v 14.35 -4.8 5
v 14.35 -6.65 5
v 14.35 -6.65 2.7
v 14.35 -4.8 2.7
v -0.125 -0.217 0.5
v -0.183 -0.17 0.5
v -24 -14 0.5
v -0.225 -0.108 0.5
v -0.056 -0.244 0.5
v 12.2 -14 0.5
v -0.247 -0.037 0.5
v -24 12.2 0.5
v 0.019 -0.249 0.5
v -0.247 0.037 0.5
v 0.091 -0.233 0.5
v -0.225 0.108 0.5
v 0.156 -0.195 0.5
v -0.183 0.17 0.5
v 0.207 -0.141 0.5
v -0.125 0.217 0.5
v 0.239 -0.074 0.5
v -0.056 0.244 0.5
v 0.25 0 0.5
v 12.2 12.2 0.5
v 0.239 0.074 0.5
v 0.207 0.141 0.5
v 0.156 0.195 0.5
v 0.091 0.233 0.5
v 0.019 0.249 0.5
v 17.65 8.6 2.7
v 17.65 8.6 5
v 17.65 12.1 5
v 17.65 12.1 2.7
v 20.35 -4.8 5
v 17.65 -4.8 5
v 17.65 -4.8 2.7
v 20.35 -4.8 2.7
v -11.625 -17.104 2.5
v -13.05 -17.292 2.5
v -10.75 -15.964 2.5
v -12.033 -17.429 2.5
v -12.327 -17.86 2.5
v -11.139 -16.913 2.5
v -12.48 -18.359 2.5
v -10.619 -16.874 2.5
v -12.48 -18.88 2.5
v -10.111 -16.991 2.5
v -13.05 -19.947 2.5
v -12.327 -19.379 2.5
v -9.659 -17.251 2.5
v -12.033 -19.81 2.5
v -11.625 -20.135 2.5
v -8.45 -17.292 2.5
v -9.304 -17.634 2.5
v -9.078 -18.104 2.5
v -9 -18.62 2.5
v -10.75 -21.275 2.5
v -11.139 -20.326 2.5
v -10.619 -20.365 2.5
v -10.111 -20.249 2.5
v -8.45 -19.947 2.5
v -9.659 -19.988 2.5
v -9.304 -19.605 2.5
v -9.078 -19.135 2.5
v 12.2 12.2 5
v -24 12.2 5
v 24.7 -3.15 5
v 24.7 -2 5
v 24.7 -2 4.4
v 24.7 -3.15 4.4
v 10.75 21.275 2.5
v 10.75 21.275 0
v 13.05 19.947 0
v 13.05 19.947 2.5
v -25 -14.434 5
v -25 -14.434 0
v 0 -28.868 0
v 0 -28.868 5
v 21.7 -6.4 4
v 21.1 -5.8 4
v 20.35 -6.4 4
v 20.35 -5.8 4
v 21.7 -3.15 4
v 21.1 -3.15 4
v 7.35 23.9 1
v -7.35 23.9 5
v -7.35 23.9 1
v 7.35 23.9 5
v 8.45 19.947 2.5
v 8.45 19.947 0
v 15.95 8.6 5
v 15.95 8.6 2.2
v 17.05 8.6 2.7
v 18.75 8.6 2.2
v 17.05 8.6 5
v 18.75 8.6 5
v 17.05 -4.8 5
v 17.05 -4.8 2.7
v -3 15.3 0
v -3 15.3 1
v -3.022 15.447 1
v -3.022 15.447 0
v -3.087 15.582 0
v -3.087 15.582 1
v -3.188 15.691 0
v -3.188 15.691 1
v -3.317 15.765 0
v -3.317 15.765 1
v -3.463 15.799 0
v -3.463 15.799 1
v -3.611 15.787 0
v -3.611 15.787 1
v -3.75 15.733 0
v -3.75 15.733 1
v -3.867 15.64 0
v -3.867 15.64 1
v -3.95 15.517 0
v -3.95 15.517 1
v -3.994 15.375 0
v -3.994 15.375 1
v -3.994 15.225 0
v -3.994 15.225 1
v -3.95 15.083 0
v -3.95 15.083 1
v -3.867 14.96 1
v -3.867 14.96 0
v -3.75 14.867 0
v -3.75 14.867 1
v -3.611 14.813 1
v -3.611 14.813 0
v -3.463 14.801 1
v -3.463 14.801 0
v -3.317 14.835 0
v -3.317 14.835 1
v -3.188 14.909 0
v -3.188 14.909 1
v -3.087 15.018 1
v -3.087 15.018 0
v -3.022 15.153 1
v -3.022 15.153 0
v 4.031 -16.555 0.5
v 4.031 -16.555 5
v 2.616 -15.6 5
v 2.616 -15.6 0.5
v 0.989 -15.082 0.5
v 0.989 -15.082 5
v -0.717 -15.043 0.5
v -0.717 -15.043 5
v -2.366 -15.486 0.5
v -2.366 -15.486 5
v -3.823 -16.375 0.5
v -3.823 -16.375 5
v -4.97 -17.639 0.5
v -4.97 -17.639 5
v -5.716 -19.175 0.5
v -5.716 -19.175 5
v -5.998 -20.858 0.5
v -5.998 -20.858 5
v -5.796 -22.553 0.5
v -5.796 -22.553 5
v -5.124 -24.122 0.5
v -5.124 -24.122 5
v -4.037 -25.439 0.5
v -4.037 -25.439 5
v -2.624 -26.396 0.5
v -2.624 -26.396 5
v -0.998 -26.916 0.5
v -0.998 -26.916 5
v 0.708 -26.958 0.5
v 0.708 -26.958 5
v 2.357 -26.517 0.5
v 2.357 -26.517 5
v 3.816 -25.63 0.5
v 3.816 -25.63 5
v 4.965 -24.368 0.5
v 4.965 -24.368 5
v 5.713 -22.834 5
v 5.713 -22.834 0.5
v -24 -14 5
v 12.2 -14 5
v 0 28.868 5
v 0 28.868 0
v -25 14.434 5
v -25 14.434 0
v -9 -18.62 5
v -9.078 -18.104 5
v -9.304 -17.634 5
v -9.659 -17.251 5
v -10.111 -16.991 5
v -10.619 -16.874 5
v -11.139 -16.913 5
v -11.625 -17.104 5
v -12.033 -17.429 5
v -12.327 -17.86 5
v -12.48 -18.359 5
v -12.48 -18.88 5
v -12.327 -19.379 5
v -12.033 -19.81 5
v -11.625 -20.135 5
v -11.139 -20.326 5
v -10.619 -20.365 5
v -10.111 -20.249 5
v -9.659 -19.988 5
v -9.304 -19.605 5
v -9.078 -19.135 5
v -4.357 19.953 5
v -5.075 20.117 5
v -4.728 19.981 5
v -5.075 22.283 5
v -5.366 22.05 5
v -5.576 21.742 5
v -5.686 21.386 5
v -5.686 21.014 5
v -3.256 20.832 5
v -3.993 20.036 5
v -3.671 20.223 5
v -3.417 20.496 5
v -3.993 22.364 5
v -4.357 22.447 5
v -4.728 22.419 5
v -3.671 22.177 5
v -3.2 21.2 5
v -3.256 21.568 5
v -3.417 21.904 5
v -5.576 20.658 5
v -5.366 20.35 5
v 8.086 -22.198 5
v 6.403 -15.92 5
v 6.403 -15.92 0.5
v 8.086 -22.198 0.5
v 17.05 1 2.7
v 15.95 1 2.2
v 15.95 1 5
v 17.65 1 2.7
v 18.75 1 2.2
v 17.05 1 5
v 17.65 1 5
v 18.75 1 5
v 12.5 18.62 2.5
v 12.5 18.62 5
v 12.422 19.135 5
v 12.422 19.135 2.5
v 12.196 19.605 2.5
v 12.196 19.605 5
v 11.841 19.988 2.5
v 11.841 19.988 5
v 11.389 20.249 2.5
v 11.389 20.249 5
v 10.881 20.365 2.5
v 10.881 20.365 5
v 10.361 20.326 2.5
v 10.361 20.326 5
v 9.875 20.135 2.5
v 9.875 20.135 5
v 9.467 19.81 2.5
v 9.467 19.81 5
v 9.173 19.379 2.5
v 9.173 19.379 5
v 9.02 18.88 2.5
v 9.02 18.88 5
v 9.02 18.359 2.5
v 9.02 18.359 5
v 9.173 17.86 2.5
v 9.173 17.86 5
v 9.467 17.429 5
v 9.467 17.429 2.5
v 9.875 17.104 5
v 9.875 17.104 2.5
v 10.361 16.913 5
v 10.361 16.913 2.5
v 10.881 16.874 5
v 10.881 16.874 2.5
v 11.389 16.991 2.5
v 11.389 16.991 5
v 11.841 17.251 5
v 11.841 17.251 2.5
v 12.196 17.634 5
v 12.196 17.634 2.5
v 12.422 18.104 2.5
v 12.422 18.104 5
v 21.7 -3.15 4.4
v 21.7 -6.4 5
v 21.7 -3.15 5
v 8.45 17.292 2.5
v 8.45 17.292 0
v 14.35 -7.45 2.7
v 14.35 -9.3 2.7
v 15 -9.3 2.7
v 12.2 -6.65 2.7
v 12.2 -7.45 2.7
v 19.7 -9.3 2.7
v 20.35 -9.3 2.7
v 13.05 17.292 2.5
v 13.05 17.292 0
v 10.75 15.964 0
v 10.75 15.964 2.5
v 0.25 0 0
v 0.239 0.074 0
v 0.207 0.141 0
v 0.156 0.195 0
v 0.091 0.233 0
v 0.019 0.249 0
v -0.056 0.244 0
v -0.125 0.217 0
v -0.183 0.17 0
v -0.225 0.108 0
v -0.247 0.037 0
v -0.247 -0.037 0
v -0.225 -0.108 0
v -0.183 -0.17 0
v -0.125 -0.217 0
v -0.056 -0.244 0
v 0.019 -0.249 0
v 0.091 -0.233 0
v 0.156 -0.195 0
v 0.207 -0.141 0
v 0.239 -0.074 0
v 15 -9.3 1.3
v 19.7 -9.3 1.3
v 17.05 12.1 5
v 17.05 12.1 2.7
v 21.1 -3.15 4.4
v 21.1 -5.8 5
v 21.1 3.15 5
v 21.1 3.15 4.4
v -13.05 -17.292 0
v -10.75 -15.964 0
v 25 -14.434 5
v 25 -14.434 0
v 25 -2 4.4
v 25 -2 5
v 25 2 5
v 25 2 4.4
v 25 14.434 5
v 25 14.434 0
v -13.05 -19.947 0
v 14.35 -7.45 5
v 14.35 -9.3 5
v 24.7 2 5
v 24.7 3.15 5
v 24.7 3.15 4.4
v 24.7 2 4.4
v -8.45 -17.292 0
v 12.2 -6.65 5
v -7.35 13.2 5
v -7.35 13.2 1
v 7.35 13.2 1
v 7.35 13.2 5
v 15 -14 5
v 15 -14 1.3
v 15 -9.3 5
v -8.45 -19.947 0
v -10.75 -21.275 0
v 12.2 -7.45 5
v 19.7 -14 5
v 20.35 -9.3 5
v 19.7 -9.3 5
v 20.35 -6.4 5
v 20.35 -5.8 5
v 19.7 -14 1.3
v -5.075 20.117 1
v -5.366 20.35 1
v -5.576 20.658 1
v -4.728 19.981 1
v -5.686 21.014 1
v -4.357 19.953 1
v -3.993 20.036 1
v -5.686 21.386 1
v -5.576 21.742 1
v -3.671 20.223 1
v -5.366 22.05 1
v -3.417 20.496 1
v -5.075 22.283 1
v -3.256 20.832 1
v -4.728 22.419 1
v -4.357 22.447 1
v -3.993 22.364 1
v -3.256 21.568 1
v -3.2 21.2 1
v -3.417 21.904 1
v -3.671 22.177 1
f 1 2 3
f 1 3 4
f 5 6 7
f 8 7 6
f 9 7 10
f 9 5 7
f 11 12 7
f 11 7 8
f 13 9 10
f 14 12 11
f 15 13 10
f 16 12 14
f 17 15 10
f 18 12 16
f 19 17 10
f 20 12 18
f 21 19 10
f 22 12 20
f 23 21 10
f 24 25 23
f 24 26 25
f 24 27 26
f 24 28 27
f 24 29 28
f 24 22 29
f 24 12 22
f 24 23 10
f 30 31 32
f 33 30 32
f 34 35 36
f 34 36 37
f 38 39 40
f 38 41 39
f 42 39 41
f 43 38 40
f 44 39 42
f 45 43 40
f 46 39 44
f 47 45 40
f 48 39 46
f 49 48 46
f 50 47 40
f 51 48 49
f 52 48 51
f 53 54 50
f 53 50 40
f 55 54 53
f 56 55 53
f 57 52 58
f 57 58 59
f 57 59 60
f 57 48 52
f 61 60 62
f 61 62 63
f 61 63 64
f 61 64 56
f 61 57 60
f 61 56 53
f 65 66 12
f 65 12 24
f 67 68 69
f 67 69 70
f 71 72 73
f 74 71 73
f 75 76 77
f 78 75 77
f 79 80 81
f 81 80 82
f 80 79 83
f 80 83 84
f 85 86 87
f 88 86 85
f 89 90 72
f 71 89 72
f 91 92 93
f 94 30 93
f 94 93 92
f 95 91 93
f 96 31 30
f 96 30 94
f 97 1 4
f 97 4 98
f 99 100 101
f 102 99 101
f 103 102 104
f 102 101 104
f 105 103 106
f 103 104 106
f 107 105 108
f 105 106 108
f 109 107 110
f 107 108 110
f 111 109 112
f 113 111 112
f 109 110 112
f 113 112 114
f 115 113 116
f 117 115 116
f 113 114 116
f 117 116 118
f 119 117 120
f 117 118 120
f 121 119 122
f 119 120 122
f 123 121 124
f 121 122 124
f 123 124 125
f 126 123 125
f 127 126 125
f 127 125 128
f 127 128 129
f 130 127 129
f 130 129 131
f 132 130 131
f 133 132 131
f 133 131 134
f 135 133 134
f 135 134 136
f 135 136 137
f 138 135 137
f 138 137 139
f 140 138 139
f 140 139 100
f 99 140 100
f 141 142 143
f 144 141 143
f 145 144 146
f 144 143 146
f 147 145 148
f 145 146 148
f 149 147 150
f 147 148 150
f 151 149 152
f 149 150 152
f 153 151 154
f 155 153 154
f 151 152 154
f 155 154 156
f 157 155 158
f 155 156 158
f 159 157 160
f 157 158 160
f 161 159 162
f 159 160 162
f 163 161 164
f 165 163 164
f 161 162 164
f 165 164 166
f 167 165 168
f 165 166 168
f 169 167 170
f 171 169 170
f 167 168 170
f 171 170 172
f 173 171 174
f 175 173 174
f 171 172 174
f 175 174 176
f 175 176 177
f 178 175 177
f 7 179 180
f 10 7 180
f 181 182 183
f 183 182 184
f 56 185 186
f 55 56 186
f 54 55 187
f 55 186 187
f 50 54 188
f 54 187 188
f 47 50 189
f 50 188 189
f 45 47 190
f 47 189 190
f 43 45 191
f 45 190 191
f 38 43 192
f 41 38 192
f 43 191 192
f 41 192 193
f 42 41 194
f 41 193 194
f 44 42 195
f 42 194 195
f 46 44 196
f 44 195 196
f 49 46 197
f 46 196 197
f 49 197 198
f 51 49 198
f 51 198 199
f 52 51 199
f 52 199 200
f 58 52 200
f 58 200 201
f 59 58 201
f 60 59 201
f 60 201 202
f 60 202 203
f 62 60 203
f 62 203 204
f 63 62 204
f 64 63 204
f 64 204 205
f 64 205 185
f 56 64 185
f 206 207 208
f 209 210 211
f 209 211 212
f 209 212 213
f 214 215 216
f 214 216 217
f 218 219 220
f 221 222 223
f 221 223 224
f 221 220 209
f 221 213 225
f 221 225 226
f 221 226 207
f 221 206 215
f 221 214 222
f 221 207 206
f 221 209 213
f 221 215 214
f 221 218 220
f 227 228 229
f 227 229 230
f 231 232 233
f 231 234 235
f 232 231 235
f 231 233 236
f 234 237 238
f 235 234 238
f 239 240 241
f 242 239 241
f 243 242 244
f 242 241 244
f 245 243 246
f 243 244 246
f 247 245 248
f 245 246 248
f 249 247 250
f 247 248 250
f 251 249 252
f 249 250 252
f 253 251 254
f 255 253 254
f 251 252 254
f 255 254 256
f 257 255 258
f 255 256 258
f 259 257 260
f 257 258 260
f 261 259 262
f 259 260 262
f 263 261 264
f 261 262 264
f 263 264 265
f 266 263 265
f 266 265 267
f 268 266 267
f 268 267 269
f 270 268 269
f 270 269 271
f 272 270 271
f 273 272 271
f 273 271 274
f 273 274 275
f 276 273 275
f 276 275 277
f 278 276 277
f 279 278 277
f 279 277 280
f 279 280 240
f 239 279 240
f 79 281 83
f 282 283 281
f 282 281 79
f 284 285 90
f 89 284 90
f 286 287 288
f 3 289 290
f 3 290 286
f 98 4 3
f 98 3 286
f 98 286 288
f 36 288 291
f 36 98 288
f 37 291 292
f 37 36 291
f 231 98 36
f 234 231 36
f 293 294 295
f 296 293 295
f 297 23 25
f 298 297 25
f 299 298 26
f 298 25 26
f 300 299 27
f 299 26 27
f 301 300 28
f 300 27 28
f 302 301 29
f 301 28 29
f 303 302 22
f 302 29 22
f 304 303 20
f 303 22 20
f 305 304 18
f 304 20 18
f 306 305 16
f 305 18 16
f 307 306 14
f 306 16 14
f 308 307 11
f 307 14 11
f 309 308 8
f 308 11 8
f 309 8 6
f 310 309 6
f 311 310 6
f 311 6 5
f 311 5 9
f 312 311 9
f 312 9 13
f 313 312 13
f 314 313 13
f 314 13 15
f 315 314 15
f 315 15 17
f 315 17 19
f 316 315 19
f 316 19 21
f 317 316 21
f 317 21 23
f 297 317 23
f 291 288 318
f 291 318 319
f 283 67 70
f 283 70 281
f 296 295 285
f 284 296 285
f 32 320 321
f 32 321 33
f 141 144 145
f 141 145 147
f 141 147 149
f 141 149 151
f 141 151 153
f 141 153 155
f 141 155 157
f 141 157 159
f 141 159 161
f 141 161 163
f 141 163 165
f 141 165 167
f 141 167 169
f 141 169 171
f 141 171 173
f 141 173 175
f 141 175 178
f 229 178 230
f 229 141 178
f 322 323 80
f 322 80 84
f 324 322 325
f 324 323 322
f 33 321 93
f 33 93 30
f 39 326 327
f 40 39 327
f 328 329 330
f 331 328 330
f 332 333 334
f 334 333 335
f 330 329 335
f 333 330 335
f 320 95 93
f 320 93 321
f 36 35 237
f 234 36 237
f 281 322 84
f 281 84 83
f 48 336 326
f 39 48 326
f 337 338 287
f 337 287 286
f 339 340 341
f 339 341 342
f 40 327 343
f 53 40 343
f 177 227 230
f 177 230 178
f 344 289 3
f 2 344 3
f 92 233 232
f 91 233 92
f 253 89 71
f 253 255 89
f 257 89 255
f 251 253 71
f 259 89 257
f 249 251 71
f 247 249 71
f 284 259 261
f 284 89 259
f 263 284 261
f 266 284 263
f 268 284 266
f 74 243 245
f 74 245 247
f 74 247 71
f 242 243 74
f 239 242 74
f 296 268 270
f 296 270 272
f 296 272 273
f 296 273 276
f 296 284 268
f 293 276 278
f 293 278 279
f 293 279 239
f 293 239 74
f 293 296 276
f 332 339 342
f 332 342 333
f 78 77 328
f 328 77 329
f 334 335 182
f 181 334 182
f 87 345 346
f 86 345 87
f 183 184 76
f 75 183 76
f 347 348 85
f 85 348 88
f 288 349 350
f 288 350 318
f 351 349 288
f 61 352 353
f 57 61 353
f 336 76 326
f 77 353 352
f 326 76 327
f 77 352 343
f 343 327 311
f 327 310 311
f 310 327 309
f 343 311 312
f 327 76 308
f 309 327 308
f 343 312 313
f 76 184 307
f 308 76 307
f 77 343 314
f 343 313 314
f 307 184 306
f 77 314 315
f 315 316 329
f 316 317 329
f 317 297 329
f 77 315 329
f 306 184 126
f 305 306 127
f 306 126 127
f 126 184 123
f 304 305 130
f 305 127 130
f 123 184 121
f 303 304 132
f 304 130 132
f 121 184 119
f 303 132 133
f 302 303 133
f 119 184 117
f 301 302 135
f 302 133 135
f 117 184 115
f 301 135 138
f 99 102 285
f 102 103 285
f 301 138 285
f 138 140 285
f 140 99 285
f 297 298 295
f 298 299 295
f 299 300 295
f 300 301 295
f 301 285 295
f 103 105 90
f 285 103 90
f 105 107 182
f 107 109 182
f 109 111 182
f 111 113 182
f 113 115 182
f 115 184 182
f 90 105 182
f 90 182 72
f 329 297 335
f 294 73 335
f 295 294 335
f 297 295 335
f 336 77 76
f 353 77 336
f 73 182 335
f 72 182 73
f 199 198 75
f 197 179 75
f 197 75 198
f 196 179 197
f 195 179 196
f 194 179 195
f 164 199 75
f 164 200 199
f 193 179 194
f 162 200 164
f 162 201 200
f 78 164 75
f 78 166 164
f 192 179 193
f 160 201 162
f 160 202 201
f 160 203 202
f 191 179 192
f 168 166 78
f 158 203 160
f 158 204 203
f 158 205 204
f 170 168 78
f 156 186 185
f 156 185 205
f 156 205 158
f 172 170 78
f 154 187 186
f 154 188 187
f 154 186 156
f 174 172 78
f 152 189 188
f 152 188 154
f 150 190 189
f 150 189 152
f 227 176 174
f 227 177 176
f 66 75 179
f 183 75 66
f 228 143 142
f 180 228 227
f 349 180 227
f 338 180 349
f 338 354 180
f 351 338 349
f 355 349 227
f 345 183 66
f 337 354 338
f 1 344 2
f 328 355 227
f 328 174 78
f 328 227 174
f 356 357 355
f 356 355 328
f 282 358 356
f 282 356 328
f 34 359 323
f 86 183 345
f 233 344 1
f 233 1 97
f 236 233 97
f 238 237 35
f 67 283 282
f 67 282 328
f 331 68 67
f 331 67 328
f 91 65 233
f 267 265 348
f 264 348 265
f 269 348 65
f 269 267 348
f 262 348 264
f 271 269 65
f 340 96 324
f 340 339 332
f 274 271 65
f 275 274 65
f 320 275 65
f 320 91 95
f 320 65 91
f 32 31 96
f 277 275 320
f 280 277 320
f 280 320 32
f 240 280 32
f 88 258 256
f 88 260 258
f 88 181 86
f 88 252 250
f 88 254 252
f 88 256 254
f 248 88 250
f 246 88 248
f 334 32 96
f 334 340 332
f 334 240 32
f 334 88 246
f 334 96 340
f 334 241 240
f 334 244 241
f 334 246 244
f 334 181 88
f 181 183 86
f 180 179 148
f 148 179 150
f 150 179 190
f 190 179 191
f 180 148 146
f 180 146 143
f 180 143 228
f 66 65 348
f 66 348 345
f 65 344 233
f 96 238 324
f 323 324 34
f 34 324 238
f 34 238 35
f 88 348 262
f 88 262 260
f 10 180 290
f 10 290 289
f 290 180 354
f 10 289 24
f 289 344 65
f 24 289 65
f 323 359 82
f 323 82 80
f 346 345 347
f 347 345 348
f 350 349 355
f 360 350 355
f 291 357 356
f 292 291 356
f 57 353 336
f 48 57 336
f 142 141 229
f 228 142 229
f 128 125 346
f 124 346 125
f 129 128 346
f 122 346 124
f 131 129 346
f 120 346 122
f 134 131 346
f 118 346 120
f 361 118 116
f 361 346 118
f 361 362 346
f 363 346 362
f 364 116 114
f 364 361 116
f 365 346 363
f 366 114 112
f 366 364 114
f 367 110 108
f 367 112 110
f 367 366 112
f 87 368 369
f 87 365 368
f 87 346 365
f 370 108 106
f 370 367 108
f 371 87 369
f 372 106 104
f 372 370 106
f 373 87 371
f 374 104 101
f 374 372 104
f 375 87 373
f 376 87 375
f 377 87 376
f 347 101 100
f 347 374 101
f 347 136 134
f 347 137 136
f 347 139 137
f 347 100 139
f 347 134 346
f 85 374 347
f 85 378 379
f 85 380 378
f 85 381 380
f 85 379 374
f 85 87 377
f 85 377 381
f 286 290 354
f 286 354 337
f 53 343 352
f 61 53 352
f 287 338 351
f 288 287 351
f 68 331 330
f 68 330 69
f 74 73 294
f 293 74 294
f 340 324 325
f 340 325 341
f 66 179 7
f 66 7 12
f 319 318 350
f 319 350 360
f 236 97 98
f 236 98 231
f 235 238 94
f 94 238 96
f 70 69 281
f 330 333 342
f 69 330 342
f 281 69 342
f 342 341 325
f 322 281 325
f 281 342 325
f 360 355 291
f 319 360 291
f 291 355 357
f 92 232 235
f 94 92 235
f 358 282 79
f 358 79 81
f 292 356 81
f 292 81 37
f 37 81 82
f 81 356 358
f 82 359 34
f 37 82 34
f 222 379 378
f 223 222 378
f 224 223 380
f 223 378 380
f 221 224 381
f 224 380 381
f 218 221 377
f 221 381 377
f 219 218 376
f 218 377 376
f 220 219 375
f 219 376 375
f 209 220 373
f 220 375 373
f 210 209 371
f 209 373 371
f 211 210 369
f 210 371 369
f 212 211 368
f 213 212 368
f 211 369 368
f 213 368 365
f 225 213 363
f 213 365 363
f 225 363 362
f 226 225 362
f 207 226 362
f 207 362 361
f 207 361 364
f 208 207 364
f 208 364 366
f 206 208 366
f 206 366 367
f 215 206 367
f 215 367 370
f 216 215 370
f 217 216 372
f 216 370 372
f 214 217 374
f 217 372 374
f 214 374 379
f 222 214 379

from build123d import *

# Parameters (mm, degrees)
PAD_DEPTH       = 5
SKETCH001_W     = 36.2
SKETCH001_H     = 26.2
POCKET_DEPTH    = 4.5
SKETCH002_W     = 14.7
SKETCH002_H     = 10.7
POCKET001_DEPTH = 4
SKETCH003_R     = 1.25
PAD001_DEPTH    = 4
SKETCH004_R     = 0.5
POCKET002_DEPTH = 1.001
SKETCH005_R     = 1.75
POCKET003_DEPTH = 5.001
POCKET004_DEPTH = 2.5
SKETCH007_W     = 4.7
SKETCH007_H     = 4.7
POCKET005_DEPTH = 3.7
SKETCH008_W     = 6
SKETCH008_H     = 4.5
POCKET006_DEPTH = 2.3
SKETCH009_W     = 0.6
SKETCH009_H     = 5.8
POCKET007_DEPTH = 2.3
SKETCH010_W     = 2.8
SKETCH010_H     = 7.6
POCKET008_DEPTH = 2.8
SKETCH011_W     = 0.6
SKETCH011_H     = 3.5
POCKET009_DEPTH = 2.3
SKETCH012_R     = 6
POCKET010_DEPTH = 4.5
POCKET011_DEPTH = 4.5
SKETCH014_W     = 2.15
SKETCH014_H     = 0.8
POCKET012_DEPTH = 2.3
POCKET013_DEPTH = 0.6
POCKET014_DEPTH = 1
SKETCH017_R     = 0.25
POCKET015_DEPTH = 0.501


with BuildPart() as part:
    # Sketch → Pad (new body)
    with BuildSketch(Plane.XY):
        Polygon((-25, 14.433757), (-25, -14.433757), (0, -28.867513), (25, -14.433757), (25, 14.433757), (0, 28.867513), align=None)
    extrude(amount=PAD_DEPTH)

    # Sketch001 → Pocket (cut)
    with BuildSketch(Plane.XY.offset(5)):
        with Locations((-5.9, -0.9)):
            Rectangle(SKETCH001_W, SKETCH001_H)
    extrude(amount=-POCKET_DEPTH, mode=Mode.SUBTRACT)

    # Sketch002 → Pocket001 (cut)
    with BuildSketch(Plane.XY.offset(5)):
        with Locations((0, 18.55)):
            Rectangle(SKETCH002_W, SKETCH002_H)
    extrude(amount=-POCKET001_DEPTH, mode=Mode.SUBTRACT)

    # Sketch003 → Pad001 (new body)
    with BuildSketch(Plane.XY.offset(1)):
        with Locations((-4.45, 21.2)):
            Circle(SKETCH003_R)
    extrude(amount=PAD001_DEPTH)

    # Sketch004 → Pocket002 (cut, through all)
    with BuildSketch(Plane.XY.offset(1)):
        with Locations((-3.5, 15.3)):
            Circle(SKETCH004_R)
    extrude(amount=-POCKET002_DEPTH, mode=Mode.SUBTRACT)

    # Sketch005 → Pocket003 (cut, through all)
    with BuildSketch(Plane.XY.offset(5)):
        with Locations((10.75, 18.619546)):
            Circle(SKETCH005_R)
        with Locations((-10.75, -18.619546)):
            Circle(SKETCH005_R)
    extrude(amount=-POCKET003_DEPTH, mode=Mode.SUBTRACT)

    # Sketch006 → Pocket004 (cut)
    with BuildSketch(Plane(origin=(0, 0, 0), x_dir=(1, 0, 0), z_dir=(0, 0, -1))):
        Polygon((-13.05, 17.291641), (-10.75, 15.963735), (-8.45, 17.291641), (-8.45, 19.947452), (-10.75, 21.275357), (-13.05, 19.947452), align=None)
        Polygon((10.75, -21.275357), (13.05, -19.947452), (13.05, -17.291641), (10.75, -15.963735), (8.45, -17.291641), (8.45, -19.947452), align=None)
    extrude(amount=-POCKET004_DEPTH, mode=Mode.SUBTRACT)

    # Sketch007 → Pocket005 (cut)
    with BuildSketch(Plane.XY.offset(5)):
        with Locations((17.35, -11.65)):
            Rectangle(SKETCH007_W, SKETCH007_H)
    extrude(amount=-POCKET005_DEPTH, mode=Mode.SUBTRACT)

    # Sketch008 → Pocket006 (cut)
    with BuildSketch(Plane.XY.offset(5)):
        with Locations((17.35, -7.05)):
            Rectangle(SKETCH008_W, SKETCH008_H)
    extrude(amount=-POCKET006_DEPTH, mode=Mode.SUBTRACT)

    # Sketch009 → Pocket007 (cut)
    with BuildSketch(Plane.XY.offset(5)):
        with Locations((17.35, -1.9)):
            Rectangle(SKETCH009_W, SKETCH009_H)
    extrude(amount=-POCKET007_DEPTH, mode=Mode.SUBTRACT)

    # Sketch010 → Pocket008 (cut)
    with BuildSketch(Plane.XY.offset(5)):
        with Locations((17.35, 4.8)):
            Rectangle(SKETCH010_W, SKETCH010_H)
    extrude(amount=-POCKET008_DEPTH, mode=Mode.SUBTRACT)

    # Sketch011 → Pocket009 (cut)
    with BuildSketch(Plane.XY.offset(5)):
        with Locations((17.35, 10.35)):
            Rectangle(SKETCH011_W, SKETCH011_H)
    extrude(amount=-POCKET009_DEPTH, mode=Mode.SUBTRACT)

    # Sketch012 → Pocket010 (cut)
    with BuildSketch(Plane.XY.offset(5)):
        with Locations((0, -21)):
            Circle(SKETCH012_R)
    extrude(amount=-POCKET010_DEPTH, mode=Mode.SUBTRACT)

    # Sketch013 → Pocket011 (cut)
    with BuildSketch(Plane.XY.offset(5)):
        Polygon((-0.841162, -17.860741), (6.403282, -15.919598), (8.085606, -22.198116), (0.841162, -24.139259), align=None)
    extrude(amount=-POCKET011_DEPTH, mode=Mode.SUBTRACT)

    # Sketch014 → Pocket012 (cut)
    with BuildSketch(Plane.XY.offset(5)):
        with Locations((13.275, -7.05)):
            Rectangle(SKETCH014_W, SKETCH014_H)
    extrude(amount=-POCKET012_DEPTH, mode=Mode.SUBTRACT)

    # Sketch015 → Pocket013 (cut)
    with BuildSketch(Plane.XY.offset(5)):
        Polygon((21.1, 3.15), (24.7, 3.15), (24.7, 2), (25.4, 2), (25.4, -2), (24.7, -2), (24.7, -3.15), (21.1, -3.15), align=None)
    extrude(amount=-POCKET013_DEPTH, mode=Mode.SUBTRACT)

    # Sketch016 → Pocket014 (cut)
    with BuildSketch(Plane.XY.offset(5)):
        Polygon((20.35, -5.8), (21.1, -5.8), (21.1, -3.15), (21.7, -3.15), (21.7, -6.4), (20.35, -6.4), align=None)
    extrude(amount=-POCKET014_DEPTH, mode=Mode.SUBTRACT)

    # Sketch017 → Pocket015 (cut, through all)
    with BuildSketch(Plane.XY.offset(0.5)):
        Circle(SKETCH017_R)
    extrude(amount=-POCKET015_DEPTH, mode=Mode.SUBTRACT)


solid = part.part
